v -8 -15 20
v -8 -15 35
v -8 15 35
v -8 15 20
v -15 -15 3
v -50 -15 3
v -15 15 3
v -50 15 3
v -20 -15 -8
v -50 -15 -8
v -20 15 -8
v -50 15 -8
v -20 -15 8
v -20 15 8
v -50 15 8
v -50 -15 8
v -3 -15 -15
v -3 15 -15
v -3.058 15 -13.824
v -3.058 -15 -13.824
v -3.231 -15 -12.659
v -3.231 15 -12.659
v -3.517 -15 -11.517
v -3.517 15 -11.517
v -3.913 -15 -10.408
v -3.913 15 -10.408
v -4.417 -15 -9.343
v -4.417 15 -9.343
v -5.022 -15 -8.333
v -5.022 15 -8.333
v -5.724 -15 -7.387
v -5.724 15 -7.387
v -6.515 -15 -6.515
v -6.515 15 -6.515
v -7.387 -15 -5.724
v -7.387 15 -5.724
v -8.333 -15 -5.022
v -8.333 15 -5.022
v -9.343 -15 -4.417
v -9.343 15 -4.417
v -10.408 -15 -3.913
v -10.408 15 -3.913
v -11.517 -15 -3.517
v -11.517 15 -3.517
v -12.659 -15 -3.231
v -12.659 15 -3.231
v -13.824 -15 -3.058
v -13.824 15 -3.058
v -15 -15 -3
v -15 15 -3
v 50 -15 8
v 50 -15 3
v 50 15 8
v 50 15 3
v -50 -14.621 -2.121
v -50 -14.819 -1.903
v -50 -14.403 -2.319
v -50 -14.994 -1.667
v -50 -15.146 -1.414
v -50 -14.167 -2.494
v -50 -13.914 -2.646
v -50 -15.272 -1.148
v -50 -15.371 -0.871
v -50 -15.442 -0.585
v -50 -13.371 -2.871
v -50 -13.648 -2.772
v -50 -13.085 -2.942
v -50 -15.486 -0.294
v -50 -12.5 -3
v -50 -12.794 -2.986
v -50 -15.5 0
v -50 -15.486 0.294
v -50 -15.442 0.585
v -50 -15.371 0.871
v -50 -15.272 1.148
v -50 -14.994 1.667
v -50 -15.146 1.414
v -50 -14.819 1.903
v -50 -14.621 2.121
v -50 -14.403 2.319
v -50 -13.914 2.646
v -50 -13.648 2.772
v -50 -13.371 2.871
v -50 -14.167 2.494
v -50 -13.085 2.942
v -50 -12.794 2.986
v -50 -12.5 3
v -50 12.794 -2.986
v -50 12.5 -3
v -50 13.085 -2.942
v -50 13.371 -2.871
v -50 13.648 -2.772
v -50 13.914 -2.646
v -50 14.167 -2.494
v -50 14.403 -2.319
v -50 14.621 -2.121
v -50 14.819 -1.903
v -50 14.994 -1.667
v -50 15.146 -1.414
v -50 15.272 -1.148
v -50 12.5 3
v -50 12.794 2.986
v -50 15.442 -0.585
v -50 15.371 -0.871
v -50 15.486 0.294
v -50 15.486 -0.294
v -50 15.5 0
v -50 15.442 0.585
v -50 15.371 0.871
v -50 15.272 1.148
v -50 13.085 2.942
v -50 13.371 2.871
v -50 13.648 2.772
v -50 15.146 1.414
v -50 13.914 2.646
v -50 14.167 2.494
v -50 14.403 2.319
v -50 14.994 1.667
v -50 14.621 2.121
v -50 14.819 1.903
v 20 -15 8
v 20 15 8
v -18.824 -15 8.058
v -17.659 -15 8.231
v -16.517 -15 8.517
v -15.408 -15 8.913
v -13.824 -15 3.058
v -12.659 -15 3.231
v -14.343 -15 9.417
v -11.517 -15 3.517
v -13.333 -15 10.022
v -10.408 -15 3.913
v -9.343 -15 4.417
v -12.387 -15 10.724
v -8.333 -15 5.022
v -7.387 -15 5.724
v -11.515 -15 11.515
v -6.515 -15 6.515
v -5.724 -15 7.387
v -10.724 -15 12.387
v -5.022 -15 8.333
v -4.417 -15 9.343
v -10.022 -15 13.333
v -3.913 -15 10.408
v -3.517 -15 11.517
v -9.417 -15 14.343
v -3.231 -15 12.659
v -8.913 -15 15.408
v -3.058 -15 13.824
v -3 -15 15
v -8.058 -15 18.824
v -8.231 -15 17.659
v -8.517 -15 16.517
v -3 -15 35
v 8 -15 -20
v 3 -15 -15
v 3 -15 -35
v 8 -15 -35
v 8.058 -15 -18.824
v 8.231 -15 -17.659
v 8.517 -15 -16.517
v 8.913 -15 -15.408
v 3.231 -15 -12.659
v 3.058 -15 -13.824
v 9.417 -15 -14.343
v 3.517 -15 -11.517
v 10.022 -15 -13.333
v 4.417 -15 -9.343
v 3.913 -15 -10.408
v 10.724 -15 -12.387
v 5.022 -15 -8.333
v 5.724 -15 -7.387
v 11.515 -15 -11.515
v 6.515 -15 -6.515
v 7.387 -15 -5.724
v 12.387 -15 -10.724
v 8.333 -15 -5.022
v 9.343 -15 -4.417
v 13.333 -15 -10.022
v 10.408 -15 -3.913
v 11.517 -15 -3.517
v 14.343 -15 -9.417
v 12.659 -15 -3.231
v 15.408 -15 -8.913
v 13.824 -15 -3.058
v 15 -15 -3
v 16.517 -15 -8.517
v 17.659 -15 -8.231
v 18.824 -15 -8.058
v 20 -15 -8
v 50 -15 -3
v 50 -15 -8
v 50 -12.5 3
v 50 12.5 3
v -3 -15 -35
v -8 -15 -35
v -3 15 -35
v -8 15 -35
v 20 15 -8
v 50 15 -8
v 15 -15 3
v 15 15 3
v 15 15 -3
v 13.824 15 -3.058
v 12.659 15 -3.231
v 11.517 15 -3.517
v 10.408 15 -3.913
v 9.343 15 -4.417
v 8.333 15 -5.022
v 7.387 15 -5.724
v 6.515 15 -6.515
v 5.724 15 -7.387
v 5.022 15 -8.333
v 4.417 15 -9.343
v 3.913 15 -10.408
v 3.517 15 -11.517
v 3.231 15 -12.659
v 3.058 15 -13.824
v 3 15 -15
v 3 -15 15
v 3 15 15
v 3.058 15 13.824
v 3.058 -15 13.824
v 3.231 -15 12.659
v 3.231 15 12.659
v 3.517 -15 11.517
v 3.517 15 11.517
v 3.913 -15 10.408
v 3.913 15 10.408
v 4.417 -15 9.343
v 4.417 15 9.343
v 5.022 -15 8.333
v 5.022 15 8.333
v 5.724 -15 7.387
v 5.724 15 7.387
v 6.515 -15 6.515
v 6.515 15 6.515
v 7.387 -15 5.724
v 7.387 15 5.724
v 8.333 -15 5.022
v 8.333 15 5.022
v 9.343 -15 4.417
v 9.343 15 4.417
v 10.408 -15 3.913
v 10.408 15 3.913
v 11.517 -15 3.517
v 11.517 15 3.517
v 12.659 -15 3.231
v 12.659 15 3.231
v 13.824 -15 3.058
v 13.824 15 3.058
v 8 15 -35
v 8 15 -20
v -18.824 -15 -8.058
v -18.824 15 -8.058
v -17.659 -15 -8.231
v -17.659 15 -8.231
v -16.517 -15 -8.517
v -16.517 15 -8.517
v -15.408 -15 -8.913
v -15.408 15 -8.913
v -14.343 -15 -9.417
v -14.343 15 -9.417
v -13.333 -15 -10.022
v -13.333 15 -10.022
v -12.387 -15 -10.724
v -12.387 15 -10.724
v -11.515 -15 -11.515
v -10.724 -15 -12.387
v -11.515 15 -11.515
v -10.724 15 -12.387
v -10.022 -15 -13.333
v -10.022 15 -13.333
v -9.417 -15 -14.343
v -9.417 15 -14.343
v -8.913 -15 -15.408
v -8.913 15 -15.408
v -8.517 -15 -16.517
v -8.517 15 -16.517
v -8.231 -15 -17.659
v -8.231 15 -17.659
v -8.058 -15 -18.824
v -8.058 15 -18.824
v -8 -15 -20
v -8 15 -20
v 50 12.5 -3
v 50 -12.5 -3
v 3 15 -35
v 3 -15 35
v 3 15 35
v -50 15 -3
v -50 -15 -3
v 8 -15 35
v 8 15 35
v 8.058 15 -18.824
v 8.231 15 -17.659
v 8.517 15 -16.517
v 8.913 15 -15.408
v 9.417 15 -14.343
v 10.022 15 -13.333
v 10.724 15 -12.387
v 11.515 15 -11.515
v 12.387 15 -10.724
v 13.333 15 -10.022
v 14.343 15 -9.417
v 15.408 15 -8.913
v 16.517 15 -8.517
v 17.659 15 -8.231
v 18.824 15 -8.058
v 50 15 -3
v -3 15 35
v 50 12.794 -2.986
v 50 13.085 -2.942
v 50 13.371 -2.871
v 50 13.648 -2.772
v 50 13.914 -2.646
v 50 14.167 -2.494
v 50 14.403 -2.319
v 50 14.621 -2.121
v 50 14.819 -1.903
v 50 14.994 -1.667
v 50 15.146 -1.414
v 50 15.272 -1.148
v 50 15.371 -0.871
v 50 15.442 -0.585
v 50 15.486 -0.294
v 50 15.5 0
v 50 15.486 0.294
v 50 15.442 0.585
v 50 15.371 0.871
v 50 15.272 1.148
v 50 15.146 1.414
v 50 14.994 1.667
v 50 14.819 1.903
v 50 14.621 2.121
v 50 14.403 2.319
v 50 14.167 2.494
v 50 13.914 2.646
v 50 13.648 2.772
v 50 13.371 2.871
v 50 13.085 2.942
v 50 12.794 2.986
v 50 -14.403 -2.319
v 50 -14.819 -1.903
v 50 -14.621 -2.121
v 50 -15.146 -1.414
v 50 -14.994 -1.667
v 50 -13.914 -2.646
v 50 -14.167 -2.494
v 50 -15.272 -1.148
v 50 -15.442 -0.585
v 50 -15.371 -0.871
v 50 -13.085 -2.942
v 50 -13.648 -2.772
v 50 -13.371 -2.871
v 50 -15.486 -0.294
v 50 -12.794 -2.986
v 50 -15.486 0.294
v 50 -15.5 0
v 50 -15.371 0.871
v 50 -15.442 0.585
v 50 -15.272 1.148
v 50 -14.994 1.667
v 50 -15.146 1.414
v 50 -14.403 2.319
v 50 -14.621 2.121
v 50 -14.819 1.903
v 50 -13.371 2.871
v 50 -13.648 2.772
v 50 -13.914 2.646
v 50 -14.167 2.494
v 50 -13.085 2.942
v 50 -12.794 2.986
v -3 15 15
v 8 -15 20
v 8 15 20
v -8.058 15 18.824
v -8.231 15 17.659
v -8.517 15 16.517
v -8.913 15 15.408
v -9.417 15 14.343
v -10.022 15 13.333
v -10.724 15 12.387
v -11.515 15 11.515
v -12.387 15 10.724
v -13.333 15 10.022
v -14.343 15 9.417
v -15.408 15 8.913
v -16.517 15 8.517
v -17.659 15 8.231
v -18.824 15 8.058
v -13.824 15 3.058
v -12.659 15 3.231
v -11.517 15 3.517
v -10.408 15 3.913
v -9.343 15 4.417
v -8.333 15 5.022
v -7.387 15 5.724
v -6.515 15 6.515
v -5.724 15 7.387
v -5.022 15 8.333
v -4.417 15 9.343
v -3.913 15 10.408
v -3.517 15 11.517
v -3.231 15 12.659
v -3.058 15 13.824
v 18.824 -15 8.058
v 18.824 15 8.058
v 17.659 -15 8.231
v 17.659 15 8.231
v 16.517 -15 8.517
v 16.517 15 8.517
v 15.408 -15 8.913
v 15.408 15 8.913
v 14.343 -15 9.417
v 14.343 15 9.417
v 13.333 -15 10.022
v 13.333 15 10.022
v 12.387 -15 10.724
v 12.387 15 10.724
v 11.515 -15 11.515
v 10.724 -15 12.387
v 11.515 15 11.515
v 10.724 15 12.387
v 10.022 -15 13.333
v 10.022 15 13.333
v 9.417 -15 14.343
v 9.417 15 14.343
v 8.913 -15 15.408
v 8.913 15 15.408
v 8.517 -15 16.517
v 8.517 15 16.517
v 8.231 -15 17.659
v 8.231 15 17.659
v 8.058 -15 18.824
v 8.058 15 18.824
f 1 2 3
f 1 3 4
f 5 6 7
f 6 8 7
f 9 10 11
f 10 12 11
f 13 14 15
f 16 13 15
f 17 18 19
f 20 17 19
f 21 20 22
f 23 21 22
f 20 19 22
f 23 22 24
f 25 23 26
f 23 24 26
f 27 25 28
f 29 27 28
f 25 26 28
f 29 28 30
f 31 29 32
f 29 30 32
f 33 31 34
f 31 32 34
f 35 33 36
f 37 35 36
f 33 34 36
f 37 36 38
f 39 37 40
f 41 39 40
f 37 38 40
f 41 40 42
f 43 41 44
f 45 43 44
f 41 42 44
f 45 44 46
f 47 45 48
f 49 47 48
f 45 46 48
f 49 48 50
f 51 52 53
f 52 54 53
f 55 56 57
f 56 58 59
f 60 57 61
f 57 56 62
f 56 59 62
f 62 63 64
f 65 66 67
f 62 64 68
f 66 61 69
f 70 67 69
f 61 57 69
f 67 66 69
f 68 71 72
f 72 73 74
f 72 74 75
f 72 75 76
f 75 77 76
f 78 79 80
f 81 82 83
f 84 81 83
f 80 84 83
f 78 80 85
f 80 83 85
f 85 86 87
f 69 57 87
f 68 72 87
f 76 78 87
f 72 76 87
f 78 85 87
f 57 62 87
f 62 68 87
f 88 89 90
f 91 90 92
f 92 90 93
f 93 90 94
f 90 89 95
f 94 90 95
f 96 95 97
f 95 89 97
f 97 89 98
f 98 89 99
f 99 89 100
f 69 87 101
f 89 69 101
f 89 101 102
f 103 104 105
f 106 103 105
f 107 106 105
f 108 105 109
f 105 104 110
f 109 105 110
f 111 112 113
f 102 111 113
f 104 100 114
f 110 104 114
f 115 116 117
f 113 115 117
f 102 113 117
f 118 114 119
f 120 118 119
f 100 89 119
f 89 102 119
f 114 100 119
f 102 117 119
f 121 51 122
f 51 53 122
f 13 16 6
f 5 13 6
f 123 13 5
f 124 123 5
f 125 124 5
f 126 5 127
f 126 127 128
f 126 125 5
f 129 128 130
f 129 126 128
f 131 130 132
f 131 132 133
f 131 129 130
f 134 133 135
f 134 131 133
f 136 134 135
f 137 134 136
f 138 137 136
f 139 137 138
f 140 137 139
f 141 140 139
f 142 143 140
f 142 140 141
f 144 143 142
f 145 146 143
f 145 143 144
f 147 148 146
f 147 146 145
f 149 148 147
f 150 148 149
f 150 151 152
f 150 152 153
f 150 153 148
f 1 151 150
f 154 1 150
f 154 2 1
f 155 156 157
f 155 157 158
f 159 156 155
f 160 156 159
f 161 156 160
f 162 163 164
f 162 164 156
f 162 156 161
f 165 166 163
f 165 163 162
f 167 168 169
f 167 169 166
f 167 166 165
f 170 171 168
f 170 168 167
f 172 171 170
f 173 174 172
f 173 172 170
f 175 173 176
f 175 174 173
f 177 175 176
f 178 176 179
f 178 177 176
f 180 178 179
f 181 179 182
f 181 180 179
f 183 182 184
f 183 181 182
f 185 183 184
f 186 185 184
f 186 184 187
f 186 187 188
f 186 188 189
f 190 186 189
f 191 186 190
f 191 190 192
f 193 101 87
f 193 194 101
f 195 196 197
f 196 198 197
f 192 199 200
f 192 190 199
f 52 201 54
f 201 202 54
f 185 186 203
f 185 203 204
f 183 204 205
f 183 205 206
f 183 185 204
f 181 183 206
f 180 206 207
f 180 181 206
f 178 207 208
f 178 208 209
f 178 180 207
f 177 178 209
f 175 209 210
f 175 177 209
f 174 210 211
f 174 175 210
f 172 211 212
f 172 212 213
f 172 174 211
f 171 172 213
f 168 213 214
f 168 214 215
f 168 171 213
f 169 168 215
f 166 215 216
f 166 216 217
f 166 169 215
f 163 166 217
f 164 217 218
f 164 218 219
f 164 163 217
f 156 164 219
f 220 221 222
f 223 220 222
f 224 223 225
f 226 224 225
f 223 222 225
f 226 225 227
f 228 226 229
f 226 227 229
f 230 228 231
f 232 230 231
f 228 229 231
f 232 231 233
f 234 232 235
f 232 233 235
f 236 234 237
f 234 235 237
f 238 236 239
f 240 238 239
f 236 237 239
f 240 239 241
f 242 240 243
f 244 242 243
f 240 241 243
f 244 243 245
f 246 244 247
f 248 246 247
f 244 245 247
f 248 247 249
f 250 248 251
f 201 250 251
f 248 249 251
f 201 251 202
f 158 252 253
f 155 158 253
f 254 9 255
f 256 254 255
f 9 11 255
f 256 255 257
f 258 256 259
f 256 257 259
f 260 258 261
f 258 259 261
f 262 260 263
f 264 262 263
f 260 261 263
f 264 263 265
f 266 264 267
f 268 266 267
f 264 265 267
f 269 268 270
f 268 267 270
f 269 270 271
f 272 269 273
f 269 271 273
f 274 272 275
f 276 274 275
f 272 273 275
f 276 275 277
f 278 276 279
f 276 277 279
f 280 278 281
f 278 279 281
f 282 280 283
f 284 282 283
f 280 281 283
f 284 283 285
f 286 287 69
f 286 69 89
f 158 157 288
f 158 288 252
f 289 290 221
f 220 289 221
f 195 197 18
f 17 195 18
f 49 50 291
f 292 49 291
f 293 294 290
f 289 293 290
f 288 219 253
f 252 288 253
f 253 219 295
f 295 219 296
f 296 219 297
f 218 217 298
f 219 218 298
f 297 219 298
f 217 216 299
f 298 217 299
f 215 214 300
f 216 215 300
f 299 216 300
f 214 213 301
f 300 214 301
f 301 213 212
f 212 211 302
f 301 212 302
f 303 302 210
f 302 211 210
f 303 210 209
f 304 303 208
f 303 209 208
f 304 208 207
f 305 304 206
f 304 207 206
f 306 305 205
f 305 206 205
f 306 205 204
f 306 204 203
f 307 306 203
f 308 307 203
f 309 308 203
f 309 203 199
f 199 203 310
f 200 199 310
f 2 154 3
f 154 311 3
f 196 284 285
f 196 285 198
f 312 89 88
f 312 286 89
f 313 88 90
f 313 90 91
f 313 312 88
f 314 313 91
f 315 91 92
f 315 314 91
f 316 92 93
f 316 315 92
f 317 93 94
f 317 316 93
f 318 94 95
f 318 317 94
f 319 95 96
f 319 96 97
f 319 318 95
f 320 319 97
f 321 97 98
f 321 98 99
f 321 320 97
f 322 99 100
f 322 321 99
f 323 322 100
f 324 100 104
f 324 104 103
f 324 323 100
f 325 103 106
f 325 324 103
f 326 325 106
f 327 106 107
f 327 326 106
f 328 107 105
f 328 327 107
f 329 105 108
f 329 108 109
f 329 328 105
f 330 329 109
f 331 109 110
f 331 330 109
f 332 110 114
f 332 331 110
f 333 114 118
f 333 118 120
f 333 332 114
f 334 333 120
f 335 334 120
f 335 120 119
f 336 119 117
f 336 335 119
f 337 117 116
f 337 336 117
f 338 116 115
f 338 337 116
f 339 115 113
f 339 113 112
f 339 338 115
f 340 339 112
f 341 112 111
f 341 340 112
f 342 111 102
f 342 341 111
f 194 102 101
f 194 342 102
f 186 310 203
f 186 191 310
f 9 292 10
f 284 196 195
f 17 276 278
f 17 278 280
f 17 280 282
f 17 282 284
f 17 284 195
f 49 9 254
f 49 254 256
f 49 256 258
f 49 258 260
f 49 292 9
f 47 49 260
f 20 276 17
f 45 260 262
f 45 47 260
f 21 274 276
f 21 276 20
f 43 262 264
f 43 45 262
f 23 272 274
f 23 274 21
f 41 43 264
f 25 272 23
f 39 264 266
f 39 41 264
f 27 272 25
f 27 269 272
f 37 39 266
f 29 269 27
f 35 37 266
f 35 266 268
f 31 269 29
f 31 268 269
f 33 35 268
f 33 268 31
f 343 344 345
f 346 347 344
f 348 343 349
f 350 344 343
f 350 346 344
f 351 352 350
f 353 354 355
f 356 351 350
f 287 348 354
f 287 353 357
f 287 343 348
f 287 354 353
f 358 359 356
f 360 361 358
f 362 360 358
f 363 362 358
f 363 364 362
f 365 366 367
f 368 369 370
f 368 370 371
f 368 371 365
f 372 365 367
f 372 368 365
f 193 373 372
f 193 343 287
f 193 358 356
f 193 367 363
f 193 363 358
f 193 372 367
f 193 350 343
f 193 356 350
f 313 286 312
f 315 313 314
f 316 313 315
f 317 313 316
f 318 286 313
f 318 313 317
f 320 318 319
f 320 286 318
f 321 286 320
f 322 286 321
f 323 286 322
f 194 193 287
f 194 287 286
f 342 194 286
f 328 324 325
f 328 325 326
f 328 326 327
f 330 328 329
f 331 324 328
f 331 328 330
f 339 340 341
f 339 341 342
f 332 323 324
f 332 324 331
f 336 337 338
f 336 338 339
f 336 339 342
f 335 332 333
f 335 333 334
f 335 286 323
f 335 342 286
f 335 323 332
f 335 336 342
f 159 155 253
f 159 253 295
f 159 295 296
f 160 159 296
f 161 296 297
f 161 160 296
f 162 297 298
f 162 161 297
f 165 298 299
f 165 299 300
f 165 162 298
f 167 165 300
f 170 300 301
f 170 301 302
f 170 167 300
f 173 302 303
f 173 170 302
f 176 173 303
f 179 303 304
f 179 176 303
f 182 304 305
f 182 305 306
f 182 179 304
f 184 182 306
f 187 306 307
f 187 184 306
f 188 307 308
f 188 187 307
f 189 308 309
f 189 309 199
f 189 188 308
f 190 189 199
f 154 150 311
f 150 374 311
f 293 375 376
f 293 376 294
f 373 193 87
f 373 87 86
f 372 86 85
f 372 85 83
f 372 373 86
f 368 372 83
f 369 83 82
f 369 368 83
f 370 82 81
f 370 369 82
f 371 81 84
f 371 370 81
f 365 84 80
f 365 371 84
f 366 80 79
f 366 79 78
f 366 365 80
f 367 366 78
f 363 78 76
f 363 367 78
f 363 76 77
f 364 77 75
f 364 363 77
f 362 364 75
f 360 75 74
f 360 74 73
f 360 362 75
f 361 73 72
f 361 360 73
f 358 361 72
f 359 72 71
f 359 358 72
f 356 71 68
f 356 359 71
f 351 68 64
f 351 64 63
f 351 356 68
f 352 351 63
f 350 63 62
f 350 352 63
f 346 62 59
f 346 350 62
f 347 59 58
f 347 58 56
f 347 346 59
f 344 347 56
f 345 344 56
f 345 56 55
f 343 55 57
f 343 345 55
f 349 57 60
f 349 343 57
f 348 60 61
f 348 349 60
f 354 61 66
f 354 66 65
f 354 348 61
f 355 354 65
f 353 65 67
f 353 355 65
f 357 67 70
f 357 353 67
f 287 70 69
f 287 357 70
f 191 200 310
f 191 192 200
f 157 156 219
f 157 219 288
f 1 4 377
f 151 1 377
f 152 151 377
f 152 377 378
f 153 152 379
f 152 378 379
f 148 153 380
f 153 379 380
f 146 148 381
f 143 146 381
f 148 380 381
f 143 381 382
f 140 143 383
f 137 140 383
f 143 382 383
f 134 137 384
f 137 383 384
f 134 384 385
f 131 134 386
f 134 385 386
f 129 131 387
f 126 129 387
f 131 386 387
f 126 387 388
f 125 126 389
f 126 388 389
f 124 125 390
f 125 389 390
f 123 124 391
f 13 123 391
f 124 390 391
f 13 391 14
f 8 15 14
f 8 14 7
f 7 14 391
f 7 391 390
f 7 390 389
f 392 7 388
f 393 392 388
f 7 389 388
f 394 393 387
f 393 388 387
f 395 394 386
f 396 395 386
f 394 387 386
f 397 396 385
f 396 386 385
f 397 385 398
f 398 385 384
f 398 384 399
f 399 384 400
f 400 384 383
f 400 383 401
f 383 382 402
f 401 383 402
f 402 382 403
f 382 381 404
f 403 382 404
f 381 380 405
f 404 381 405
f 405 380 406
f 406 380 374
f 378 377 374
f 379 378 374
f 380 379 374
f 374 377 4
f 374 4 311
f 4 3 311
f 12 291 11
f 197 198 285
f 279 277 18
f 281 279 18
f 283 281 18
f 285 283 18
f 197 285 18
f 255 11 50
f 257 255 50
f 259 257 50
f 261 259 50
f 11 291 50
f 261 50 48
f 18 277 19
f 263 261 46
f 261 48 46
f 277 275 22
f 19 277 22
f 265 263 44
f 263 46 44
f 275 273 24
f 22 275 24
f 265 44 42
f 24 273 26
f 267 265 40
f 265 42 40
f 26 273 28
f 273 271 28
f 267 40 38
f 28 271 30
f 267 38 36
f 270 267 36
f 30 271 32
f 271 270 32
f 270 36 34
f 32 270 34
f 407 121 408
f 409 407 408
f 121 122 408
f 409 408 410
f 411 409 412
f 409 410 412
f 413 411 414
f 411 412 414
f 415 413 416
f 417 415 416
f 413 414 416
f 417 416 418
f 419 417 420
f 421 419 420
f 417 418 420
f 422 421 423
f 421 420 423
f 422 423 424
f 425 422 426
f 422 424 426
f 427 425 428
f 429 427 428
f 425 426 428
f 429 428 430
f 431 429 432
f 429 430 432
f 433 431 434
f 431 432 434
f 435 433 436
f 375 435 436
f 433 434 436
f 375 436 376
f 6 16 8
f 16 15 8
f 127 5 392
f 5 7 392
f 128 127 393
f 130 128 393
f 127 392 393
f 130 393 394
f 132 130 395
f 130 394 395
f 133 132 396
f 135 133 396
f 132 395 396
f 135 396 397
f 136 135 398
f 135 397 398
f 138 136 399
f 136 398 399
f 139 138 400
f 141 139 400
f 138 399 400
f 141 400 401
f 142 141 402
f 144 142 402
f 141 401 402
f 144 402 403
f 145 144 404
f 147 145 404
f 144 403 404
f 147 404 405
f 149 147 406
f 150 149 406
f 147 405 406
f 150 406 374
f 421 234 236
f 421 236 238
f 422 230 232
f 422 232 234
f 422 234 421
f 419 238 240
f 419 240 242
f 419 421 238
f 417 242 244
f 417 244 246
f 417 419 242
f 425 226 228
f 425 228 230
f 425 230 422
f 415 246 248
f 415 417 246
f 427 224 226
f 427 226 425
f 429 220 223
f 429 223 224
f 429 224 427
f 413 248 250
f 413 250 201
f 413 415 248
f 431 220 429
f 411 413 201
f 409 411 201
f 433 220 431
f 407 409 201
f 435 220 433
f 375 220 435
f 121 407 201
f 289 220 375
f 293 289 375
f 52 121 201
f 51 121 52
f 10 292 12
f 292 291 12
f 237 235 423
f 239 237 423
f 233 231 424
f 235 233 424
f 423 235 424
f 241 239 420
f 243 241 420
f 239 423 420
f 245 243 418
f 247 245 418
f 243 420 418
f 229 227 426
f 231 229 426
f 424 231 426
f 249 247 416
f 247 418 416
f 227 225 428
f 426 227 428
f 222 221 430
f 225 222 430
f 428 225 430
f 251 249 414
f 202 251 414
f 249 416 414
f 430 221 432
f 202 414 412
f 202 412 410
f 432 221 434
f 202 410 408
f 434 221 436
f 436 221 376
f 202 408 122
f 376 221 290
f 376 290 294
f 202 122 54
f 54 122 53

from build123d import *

# Parameters (mm, degrees)
F1_DEPTH = 50
F3_DEPTH = 15


with BuildPart() as f1:
    # F0 (on Right) → F1 (new body, symmetric)
    with BuildSketch(Plane.YZ):
        with BuildLine():
            Line((12.5, 3), (-12.5, 3))
            ThreePointArc((-12.5, 3), (-15.5, 0), (-12.5, -3))
            Line((-12.5, -3), (12.5, -3))
            ThreePointArc((12.5, -3), (15.5, 0), (12.5, 3))
        make_face()
    extrude(amount=F1_DEPTH, both=True)


with BuildPart() as f3:
    # F2 (on Front) → F3 (new body, symmetric)
    with BuildSketch(Plane.XZ):
        with BuildLine():
            Line((-20, 8), (-50, 8))
            Line((-50, 8), (-50, 3))
            Line((-50, 3), (-15, 3))
            ThreePointArc((-15, 3), (-6.514719, 6.514719), (-3, 15))
            Line((-3, 15), (-3, 35))
            Line((-3, 35), (-8, 35))
            Line((-8, 35), (-8, 20))
            ThreePointArc((-8, 20), (-11.514719, 11.514719), (-20, 8))
        make_face()
        with BuildLine():
            ThreePointArc((3, 15), (6.514719, 6.514719), (15, 3))
            Line((15, 3), (50, 3))
            Line((50, 3), (50, 8))
            Line((50, 8), (20, 8))
            ThreePointArc((20, 8), (11.514719, 11.514719), (8, 20))
            Line((8, 20), (8, 35))
            Line((8, 35), (3, 35))
            Line((3, 35), (3, 15))
        make_face()
        with BuildLine():
            Line((-15, -3), (-50, -3))
            Line((-50, -3), (-50, -8))
            Line((-50, -8), (-20, -8))
            ThreePointArc((-20, -8), (-11.514719, -11.514719), (-8, -20))
            Line((-8, -20), (-8, -35))
            Line((-8, -35), (-3, -35))
            Line((-3, -35), (-3, -15))
            ThreePointArc((-3, -15), (-6.514719, -6.514719), (-15, -3))
        make_face()
        with BuildLine():
            Line((50, -3), (15, -3))
            ThreePointArc((15, -3), (6.514719, -6.514719), (3, -15))
            Line((3, -15), (3, -35))
            Line((3, -35), (8, -35))
            Line((8, -35), (8, -20))
            ThreePointArc((8, -20), (11.514719, -11.514719), (20, -8))
            Line((20, -8), (50, -8))
            Line((50, -8), (50, -3))
        make_face()
    extrude(amount=F3_DEPTH, both=True)


solid = Compound([f1.part, f3.part])
